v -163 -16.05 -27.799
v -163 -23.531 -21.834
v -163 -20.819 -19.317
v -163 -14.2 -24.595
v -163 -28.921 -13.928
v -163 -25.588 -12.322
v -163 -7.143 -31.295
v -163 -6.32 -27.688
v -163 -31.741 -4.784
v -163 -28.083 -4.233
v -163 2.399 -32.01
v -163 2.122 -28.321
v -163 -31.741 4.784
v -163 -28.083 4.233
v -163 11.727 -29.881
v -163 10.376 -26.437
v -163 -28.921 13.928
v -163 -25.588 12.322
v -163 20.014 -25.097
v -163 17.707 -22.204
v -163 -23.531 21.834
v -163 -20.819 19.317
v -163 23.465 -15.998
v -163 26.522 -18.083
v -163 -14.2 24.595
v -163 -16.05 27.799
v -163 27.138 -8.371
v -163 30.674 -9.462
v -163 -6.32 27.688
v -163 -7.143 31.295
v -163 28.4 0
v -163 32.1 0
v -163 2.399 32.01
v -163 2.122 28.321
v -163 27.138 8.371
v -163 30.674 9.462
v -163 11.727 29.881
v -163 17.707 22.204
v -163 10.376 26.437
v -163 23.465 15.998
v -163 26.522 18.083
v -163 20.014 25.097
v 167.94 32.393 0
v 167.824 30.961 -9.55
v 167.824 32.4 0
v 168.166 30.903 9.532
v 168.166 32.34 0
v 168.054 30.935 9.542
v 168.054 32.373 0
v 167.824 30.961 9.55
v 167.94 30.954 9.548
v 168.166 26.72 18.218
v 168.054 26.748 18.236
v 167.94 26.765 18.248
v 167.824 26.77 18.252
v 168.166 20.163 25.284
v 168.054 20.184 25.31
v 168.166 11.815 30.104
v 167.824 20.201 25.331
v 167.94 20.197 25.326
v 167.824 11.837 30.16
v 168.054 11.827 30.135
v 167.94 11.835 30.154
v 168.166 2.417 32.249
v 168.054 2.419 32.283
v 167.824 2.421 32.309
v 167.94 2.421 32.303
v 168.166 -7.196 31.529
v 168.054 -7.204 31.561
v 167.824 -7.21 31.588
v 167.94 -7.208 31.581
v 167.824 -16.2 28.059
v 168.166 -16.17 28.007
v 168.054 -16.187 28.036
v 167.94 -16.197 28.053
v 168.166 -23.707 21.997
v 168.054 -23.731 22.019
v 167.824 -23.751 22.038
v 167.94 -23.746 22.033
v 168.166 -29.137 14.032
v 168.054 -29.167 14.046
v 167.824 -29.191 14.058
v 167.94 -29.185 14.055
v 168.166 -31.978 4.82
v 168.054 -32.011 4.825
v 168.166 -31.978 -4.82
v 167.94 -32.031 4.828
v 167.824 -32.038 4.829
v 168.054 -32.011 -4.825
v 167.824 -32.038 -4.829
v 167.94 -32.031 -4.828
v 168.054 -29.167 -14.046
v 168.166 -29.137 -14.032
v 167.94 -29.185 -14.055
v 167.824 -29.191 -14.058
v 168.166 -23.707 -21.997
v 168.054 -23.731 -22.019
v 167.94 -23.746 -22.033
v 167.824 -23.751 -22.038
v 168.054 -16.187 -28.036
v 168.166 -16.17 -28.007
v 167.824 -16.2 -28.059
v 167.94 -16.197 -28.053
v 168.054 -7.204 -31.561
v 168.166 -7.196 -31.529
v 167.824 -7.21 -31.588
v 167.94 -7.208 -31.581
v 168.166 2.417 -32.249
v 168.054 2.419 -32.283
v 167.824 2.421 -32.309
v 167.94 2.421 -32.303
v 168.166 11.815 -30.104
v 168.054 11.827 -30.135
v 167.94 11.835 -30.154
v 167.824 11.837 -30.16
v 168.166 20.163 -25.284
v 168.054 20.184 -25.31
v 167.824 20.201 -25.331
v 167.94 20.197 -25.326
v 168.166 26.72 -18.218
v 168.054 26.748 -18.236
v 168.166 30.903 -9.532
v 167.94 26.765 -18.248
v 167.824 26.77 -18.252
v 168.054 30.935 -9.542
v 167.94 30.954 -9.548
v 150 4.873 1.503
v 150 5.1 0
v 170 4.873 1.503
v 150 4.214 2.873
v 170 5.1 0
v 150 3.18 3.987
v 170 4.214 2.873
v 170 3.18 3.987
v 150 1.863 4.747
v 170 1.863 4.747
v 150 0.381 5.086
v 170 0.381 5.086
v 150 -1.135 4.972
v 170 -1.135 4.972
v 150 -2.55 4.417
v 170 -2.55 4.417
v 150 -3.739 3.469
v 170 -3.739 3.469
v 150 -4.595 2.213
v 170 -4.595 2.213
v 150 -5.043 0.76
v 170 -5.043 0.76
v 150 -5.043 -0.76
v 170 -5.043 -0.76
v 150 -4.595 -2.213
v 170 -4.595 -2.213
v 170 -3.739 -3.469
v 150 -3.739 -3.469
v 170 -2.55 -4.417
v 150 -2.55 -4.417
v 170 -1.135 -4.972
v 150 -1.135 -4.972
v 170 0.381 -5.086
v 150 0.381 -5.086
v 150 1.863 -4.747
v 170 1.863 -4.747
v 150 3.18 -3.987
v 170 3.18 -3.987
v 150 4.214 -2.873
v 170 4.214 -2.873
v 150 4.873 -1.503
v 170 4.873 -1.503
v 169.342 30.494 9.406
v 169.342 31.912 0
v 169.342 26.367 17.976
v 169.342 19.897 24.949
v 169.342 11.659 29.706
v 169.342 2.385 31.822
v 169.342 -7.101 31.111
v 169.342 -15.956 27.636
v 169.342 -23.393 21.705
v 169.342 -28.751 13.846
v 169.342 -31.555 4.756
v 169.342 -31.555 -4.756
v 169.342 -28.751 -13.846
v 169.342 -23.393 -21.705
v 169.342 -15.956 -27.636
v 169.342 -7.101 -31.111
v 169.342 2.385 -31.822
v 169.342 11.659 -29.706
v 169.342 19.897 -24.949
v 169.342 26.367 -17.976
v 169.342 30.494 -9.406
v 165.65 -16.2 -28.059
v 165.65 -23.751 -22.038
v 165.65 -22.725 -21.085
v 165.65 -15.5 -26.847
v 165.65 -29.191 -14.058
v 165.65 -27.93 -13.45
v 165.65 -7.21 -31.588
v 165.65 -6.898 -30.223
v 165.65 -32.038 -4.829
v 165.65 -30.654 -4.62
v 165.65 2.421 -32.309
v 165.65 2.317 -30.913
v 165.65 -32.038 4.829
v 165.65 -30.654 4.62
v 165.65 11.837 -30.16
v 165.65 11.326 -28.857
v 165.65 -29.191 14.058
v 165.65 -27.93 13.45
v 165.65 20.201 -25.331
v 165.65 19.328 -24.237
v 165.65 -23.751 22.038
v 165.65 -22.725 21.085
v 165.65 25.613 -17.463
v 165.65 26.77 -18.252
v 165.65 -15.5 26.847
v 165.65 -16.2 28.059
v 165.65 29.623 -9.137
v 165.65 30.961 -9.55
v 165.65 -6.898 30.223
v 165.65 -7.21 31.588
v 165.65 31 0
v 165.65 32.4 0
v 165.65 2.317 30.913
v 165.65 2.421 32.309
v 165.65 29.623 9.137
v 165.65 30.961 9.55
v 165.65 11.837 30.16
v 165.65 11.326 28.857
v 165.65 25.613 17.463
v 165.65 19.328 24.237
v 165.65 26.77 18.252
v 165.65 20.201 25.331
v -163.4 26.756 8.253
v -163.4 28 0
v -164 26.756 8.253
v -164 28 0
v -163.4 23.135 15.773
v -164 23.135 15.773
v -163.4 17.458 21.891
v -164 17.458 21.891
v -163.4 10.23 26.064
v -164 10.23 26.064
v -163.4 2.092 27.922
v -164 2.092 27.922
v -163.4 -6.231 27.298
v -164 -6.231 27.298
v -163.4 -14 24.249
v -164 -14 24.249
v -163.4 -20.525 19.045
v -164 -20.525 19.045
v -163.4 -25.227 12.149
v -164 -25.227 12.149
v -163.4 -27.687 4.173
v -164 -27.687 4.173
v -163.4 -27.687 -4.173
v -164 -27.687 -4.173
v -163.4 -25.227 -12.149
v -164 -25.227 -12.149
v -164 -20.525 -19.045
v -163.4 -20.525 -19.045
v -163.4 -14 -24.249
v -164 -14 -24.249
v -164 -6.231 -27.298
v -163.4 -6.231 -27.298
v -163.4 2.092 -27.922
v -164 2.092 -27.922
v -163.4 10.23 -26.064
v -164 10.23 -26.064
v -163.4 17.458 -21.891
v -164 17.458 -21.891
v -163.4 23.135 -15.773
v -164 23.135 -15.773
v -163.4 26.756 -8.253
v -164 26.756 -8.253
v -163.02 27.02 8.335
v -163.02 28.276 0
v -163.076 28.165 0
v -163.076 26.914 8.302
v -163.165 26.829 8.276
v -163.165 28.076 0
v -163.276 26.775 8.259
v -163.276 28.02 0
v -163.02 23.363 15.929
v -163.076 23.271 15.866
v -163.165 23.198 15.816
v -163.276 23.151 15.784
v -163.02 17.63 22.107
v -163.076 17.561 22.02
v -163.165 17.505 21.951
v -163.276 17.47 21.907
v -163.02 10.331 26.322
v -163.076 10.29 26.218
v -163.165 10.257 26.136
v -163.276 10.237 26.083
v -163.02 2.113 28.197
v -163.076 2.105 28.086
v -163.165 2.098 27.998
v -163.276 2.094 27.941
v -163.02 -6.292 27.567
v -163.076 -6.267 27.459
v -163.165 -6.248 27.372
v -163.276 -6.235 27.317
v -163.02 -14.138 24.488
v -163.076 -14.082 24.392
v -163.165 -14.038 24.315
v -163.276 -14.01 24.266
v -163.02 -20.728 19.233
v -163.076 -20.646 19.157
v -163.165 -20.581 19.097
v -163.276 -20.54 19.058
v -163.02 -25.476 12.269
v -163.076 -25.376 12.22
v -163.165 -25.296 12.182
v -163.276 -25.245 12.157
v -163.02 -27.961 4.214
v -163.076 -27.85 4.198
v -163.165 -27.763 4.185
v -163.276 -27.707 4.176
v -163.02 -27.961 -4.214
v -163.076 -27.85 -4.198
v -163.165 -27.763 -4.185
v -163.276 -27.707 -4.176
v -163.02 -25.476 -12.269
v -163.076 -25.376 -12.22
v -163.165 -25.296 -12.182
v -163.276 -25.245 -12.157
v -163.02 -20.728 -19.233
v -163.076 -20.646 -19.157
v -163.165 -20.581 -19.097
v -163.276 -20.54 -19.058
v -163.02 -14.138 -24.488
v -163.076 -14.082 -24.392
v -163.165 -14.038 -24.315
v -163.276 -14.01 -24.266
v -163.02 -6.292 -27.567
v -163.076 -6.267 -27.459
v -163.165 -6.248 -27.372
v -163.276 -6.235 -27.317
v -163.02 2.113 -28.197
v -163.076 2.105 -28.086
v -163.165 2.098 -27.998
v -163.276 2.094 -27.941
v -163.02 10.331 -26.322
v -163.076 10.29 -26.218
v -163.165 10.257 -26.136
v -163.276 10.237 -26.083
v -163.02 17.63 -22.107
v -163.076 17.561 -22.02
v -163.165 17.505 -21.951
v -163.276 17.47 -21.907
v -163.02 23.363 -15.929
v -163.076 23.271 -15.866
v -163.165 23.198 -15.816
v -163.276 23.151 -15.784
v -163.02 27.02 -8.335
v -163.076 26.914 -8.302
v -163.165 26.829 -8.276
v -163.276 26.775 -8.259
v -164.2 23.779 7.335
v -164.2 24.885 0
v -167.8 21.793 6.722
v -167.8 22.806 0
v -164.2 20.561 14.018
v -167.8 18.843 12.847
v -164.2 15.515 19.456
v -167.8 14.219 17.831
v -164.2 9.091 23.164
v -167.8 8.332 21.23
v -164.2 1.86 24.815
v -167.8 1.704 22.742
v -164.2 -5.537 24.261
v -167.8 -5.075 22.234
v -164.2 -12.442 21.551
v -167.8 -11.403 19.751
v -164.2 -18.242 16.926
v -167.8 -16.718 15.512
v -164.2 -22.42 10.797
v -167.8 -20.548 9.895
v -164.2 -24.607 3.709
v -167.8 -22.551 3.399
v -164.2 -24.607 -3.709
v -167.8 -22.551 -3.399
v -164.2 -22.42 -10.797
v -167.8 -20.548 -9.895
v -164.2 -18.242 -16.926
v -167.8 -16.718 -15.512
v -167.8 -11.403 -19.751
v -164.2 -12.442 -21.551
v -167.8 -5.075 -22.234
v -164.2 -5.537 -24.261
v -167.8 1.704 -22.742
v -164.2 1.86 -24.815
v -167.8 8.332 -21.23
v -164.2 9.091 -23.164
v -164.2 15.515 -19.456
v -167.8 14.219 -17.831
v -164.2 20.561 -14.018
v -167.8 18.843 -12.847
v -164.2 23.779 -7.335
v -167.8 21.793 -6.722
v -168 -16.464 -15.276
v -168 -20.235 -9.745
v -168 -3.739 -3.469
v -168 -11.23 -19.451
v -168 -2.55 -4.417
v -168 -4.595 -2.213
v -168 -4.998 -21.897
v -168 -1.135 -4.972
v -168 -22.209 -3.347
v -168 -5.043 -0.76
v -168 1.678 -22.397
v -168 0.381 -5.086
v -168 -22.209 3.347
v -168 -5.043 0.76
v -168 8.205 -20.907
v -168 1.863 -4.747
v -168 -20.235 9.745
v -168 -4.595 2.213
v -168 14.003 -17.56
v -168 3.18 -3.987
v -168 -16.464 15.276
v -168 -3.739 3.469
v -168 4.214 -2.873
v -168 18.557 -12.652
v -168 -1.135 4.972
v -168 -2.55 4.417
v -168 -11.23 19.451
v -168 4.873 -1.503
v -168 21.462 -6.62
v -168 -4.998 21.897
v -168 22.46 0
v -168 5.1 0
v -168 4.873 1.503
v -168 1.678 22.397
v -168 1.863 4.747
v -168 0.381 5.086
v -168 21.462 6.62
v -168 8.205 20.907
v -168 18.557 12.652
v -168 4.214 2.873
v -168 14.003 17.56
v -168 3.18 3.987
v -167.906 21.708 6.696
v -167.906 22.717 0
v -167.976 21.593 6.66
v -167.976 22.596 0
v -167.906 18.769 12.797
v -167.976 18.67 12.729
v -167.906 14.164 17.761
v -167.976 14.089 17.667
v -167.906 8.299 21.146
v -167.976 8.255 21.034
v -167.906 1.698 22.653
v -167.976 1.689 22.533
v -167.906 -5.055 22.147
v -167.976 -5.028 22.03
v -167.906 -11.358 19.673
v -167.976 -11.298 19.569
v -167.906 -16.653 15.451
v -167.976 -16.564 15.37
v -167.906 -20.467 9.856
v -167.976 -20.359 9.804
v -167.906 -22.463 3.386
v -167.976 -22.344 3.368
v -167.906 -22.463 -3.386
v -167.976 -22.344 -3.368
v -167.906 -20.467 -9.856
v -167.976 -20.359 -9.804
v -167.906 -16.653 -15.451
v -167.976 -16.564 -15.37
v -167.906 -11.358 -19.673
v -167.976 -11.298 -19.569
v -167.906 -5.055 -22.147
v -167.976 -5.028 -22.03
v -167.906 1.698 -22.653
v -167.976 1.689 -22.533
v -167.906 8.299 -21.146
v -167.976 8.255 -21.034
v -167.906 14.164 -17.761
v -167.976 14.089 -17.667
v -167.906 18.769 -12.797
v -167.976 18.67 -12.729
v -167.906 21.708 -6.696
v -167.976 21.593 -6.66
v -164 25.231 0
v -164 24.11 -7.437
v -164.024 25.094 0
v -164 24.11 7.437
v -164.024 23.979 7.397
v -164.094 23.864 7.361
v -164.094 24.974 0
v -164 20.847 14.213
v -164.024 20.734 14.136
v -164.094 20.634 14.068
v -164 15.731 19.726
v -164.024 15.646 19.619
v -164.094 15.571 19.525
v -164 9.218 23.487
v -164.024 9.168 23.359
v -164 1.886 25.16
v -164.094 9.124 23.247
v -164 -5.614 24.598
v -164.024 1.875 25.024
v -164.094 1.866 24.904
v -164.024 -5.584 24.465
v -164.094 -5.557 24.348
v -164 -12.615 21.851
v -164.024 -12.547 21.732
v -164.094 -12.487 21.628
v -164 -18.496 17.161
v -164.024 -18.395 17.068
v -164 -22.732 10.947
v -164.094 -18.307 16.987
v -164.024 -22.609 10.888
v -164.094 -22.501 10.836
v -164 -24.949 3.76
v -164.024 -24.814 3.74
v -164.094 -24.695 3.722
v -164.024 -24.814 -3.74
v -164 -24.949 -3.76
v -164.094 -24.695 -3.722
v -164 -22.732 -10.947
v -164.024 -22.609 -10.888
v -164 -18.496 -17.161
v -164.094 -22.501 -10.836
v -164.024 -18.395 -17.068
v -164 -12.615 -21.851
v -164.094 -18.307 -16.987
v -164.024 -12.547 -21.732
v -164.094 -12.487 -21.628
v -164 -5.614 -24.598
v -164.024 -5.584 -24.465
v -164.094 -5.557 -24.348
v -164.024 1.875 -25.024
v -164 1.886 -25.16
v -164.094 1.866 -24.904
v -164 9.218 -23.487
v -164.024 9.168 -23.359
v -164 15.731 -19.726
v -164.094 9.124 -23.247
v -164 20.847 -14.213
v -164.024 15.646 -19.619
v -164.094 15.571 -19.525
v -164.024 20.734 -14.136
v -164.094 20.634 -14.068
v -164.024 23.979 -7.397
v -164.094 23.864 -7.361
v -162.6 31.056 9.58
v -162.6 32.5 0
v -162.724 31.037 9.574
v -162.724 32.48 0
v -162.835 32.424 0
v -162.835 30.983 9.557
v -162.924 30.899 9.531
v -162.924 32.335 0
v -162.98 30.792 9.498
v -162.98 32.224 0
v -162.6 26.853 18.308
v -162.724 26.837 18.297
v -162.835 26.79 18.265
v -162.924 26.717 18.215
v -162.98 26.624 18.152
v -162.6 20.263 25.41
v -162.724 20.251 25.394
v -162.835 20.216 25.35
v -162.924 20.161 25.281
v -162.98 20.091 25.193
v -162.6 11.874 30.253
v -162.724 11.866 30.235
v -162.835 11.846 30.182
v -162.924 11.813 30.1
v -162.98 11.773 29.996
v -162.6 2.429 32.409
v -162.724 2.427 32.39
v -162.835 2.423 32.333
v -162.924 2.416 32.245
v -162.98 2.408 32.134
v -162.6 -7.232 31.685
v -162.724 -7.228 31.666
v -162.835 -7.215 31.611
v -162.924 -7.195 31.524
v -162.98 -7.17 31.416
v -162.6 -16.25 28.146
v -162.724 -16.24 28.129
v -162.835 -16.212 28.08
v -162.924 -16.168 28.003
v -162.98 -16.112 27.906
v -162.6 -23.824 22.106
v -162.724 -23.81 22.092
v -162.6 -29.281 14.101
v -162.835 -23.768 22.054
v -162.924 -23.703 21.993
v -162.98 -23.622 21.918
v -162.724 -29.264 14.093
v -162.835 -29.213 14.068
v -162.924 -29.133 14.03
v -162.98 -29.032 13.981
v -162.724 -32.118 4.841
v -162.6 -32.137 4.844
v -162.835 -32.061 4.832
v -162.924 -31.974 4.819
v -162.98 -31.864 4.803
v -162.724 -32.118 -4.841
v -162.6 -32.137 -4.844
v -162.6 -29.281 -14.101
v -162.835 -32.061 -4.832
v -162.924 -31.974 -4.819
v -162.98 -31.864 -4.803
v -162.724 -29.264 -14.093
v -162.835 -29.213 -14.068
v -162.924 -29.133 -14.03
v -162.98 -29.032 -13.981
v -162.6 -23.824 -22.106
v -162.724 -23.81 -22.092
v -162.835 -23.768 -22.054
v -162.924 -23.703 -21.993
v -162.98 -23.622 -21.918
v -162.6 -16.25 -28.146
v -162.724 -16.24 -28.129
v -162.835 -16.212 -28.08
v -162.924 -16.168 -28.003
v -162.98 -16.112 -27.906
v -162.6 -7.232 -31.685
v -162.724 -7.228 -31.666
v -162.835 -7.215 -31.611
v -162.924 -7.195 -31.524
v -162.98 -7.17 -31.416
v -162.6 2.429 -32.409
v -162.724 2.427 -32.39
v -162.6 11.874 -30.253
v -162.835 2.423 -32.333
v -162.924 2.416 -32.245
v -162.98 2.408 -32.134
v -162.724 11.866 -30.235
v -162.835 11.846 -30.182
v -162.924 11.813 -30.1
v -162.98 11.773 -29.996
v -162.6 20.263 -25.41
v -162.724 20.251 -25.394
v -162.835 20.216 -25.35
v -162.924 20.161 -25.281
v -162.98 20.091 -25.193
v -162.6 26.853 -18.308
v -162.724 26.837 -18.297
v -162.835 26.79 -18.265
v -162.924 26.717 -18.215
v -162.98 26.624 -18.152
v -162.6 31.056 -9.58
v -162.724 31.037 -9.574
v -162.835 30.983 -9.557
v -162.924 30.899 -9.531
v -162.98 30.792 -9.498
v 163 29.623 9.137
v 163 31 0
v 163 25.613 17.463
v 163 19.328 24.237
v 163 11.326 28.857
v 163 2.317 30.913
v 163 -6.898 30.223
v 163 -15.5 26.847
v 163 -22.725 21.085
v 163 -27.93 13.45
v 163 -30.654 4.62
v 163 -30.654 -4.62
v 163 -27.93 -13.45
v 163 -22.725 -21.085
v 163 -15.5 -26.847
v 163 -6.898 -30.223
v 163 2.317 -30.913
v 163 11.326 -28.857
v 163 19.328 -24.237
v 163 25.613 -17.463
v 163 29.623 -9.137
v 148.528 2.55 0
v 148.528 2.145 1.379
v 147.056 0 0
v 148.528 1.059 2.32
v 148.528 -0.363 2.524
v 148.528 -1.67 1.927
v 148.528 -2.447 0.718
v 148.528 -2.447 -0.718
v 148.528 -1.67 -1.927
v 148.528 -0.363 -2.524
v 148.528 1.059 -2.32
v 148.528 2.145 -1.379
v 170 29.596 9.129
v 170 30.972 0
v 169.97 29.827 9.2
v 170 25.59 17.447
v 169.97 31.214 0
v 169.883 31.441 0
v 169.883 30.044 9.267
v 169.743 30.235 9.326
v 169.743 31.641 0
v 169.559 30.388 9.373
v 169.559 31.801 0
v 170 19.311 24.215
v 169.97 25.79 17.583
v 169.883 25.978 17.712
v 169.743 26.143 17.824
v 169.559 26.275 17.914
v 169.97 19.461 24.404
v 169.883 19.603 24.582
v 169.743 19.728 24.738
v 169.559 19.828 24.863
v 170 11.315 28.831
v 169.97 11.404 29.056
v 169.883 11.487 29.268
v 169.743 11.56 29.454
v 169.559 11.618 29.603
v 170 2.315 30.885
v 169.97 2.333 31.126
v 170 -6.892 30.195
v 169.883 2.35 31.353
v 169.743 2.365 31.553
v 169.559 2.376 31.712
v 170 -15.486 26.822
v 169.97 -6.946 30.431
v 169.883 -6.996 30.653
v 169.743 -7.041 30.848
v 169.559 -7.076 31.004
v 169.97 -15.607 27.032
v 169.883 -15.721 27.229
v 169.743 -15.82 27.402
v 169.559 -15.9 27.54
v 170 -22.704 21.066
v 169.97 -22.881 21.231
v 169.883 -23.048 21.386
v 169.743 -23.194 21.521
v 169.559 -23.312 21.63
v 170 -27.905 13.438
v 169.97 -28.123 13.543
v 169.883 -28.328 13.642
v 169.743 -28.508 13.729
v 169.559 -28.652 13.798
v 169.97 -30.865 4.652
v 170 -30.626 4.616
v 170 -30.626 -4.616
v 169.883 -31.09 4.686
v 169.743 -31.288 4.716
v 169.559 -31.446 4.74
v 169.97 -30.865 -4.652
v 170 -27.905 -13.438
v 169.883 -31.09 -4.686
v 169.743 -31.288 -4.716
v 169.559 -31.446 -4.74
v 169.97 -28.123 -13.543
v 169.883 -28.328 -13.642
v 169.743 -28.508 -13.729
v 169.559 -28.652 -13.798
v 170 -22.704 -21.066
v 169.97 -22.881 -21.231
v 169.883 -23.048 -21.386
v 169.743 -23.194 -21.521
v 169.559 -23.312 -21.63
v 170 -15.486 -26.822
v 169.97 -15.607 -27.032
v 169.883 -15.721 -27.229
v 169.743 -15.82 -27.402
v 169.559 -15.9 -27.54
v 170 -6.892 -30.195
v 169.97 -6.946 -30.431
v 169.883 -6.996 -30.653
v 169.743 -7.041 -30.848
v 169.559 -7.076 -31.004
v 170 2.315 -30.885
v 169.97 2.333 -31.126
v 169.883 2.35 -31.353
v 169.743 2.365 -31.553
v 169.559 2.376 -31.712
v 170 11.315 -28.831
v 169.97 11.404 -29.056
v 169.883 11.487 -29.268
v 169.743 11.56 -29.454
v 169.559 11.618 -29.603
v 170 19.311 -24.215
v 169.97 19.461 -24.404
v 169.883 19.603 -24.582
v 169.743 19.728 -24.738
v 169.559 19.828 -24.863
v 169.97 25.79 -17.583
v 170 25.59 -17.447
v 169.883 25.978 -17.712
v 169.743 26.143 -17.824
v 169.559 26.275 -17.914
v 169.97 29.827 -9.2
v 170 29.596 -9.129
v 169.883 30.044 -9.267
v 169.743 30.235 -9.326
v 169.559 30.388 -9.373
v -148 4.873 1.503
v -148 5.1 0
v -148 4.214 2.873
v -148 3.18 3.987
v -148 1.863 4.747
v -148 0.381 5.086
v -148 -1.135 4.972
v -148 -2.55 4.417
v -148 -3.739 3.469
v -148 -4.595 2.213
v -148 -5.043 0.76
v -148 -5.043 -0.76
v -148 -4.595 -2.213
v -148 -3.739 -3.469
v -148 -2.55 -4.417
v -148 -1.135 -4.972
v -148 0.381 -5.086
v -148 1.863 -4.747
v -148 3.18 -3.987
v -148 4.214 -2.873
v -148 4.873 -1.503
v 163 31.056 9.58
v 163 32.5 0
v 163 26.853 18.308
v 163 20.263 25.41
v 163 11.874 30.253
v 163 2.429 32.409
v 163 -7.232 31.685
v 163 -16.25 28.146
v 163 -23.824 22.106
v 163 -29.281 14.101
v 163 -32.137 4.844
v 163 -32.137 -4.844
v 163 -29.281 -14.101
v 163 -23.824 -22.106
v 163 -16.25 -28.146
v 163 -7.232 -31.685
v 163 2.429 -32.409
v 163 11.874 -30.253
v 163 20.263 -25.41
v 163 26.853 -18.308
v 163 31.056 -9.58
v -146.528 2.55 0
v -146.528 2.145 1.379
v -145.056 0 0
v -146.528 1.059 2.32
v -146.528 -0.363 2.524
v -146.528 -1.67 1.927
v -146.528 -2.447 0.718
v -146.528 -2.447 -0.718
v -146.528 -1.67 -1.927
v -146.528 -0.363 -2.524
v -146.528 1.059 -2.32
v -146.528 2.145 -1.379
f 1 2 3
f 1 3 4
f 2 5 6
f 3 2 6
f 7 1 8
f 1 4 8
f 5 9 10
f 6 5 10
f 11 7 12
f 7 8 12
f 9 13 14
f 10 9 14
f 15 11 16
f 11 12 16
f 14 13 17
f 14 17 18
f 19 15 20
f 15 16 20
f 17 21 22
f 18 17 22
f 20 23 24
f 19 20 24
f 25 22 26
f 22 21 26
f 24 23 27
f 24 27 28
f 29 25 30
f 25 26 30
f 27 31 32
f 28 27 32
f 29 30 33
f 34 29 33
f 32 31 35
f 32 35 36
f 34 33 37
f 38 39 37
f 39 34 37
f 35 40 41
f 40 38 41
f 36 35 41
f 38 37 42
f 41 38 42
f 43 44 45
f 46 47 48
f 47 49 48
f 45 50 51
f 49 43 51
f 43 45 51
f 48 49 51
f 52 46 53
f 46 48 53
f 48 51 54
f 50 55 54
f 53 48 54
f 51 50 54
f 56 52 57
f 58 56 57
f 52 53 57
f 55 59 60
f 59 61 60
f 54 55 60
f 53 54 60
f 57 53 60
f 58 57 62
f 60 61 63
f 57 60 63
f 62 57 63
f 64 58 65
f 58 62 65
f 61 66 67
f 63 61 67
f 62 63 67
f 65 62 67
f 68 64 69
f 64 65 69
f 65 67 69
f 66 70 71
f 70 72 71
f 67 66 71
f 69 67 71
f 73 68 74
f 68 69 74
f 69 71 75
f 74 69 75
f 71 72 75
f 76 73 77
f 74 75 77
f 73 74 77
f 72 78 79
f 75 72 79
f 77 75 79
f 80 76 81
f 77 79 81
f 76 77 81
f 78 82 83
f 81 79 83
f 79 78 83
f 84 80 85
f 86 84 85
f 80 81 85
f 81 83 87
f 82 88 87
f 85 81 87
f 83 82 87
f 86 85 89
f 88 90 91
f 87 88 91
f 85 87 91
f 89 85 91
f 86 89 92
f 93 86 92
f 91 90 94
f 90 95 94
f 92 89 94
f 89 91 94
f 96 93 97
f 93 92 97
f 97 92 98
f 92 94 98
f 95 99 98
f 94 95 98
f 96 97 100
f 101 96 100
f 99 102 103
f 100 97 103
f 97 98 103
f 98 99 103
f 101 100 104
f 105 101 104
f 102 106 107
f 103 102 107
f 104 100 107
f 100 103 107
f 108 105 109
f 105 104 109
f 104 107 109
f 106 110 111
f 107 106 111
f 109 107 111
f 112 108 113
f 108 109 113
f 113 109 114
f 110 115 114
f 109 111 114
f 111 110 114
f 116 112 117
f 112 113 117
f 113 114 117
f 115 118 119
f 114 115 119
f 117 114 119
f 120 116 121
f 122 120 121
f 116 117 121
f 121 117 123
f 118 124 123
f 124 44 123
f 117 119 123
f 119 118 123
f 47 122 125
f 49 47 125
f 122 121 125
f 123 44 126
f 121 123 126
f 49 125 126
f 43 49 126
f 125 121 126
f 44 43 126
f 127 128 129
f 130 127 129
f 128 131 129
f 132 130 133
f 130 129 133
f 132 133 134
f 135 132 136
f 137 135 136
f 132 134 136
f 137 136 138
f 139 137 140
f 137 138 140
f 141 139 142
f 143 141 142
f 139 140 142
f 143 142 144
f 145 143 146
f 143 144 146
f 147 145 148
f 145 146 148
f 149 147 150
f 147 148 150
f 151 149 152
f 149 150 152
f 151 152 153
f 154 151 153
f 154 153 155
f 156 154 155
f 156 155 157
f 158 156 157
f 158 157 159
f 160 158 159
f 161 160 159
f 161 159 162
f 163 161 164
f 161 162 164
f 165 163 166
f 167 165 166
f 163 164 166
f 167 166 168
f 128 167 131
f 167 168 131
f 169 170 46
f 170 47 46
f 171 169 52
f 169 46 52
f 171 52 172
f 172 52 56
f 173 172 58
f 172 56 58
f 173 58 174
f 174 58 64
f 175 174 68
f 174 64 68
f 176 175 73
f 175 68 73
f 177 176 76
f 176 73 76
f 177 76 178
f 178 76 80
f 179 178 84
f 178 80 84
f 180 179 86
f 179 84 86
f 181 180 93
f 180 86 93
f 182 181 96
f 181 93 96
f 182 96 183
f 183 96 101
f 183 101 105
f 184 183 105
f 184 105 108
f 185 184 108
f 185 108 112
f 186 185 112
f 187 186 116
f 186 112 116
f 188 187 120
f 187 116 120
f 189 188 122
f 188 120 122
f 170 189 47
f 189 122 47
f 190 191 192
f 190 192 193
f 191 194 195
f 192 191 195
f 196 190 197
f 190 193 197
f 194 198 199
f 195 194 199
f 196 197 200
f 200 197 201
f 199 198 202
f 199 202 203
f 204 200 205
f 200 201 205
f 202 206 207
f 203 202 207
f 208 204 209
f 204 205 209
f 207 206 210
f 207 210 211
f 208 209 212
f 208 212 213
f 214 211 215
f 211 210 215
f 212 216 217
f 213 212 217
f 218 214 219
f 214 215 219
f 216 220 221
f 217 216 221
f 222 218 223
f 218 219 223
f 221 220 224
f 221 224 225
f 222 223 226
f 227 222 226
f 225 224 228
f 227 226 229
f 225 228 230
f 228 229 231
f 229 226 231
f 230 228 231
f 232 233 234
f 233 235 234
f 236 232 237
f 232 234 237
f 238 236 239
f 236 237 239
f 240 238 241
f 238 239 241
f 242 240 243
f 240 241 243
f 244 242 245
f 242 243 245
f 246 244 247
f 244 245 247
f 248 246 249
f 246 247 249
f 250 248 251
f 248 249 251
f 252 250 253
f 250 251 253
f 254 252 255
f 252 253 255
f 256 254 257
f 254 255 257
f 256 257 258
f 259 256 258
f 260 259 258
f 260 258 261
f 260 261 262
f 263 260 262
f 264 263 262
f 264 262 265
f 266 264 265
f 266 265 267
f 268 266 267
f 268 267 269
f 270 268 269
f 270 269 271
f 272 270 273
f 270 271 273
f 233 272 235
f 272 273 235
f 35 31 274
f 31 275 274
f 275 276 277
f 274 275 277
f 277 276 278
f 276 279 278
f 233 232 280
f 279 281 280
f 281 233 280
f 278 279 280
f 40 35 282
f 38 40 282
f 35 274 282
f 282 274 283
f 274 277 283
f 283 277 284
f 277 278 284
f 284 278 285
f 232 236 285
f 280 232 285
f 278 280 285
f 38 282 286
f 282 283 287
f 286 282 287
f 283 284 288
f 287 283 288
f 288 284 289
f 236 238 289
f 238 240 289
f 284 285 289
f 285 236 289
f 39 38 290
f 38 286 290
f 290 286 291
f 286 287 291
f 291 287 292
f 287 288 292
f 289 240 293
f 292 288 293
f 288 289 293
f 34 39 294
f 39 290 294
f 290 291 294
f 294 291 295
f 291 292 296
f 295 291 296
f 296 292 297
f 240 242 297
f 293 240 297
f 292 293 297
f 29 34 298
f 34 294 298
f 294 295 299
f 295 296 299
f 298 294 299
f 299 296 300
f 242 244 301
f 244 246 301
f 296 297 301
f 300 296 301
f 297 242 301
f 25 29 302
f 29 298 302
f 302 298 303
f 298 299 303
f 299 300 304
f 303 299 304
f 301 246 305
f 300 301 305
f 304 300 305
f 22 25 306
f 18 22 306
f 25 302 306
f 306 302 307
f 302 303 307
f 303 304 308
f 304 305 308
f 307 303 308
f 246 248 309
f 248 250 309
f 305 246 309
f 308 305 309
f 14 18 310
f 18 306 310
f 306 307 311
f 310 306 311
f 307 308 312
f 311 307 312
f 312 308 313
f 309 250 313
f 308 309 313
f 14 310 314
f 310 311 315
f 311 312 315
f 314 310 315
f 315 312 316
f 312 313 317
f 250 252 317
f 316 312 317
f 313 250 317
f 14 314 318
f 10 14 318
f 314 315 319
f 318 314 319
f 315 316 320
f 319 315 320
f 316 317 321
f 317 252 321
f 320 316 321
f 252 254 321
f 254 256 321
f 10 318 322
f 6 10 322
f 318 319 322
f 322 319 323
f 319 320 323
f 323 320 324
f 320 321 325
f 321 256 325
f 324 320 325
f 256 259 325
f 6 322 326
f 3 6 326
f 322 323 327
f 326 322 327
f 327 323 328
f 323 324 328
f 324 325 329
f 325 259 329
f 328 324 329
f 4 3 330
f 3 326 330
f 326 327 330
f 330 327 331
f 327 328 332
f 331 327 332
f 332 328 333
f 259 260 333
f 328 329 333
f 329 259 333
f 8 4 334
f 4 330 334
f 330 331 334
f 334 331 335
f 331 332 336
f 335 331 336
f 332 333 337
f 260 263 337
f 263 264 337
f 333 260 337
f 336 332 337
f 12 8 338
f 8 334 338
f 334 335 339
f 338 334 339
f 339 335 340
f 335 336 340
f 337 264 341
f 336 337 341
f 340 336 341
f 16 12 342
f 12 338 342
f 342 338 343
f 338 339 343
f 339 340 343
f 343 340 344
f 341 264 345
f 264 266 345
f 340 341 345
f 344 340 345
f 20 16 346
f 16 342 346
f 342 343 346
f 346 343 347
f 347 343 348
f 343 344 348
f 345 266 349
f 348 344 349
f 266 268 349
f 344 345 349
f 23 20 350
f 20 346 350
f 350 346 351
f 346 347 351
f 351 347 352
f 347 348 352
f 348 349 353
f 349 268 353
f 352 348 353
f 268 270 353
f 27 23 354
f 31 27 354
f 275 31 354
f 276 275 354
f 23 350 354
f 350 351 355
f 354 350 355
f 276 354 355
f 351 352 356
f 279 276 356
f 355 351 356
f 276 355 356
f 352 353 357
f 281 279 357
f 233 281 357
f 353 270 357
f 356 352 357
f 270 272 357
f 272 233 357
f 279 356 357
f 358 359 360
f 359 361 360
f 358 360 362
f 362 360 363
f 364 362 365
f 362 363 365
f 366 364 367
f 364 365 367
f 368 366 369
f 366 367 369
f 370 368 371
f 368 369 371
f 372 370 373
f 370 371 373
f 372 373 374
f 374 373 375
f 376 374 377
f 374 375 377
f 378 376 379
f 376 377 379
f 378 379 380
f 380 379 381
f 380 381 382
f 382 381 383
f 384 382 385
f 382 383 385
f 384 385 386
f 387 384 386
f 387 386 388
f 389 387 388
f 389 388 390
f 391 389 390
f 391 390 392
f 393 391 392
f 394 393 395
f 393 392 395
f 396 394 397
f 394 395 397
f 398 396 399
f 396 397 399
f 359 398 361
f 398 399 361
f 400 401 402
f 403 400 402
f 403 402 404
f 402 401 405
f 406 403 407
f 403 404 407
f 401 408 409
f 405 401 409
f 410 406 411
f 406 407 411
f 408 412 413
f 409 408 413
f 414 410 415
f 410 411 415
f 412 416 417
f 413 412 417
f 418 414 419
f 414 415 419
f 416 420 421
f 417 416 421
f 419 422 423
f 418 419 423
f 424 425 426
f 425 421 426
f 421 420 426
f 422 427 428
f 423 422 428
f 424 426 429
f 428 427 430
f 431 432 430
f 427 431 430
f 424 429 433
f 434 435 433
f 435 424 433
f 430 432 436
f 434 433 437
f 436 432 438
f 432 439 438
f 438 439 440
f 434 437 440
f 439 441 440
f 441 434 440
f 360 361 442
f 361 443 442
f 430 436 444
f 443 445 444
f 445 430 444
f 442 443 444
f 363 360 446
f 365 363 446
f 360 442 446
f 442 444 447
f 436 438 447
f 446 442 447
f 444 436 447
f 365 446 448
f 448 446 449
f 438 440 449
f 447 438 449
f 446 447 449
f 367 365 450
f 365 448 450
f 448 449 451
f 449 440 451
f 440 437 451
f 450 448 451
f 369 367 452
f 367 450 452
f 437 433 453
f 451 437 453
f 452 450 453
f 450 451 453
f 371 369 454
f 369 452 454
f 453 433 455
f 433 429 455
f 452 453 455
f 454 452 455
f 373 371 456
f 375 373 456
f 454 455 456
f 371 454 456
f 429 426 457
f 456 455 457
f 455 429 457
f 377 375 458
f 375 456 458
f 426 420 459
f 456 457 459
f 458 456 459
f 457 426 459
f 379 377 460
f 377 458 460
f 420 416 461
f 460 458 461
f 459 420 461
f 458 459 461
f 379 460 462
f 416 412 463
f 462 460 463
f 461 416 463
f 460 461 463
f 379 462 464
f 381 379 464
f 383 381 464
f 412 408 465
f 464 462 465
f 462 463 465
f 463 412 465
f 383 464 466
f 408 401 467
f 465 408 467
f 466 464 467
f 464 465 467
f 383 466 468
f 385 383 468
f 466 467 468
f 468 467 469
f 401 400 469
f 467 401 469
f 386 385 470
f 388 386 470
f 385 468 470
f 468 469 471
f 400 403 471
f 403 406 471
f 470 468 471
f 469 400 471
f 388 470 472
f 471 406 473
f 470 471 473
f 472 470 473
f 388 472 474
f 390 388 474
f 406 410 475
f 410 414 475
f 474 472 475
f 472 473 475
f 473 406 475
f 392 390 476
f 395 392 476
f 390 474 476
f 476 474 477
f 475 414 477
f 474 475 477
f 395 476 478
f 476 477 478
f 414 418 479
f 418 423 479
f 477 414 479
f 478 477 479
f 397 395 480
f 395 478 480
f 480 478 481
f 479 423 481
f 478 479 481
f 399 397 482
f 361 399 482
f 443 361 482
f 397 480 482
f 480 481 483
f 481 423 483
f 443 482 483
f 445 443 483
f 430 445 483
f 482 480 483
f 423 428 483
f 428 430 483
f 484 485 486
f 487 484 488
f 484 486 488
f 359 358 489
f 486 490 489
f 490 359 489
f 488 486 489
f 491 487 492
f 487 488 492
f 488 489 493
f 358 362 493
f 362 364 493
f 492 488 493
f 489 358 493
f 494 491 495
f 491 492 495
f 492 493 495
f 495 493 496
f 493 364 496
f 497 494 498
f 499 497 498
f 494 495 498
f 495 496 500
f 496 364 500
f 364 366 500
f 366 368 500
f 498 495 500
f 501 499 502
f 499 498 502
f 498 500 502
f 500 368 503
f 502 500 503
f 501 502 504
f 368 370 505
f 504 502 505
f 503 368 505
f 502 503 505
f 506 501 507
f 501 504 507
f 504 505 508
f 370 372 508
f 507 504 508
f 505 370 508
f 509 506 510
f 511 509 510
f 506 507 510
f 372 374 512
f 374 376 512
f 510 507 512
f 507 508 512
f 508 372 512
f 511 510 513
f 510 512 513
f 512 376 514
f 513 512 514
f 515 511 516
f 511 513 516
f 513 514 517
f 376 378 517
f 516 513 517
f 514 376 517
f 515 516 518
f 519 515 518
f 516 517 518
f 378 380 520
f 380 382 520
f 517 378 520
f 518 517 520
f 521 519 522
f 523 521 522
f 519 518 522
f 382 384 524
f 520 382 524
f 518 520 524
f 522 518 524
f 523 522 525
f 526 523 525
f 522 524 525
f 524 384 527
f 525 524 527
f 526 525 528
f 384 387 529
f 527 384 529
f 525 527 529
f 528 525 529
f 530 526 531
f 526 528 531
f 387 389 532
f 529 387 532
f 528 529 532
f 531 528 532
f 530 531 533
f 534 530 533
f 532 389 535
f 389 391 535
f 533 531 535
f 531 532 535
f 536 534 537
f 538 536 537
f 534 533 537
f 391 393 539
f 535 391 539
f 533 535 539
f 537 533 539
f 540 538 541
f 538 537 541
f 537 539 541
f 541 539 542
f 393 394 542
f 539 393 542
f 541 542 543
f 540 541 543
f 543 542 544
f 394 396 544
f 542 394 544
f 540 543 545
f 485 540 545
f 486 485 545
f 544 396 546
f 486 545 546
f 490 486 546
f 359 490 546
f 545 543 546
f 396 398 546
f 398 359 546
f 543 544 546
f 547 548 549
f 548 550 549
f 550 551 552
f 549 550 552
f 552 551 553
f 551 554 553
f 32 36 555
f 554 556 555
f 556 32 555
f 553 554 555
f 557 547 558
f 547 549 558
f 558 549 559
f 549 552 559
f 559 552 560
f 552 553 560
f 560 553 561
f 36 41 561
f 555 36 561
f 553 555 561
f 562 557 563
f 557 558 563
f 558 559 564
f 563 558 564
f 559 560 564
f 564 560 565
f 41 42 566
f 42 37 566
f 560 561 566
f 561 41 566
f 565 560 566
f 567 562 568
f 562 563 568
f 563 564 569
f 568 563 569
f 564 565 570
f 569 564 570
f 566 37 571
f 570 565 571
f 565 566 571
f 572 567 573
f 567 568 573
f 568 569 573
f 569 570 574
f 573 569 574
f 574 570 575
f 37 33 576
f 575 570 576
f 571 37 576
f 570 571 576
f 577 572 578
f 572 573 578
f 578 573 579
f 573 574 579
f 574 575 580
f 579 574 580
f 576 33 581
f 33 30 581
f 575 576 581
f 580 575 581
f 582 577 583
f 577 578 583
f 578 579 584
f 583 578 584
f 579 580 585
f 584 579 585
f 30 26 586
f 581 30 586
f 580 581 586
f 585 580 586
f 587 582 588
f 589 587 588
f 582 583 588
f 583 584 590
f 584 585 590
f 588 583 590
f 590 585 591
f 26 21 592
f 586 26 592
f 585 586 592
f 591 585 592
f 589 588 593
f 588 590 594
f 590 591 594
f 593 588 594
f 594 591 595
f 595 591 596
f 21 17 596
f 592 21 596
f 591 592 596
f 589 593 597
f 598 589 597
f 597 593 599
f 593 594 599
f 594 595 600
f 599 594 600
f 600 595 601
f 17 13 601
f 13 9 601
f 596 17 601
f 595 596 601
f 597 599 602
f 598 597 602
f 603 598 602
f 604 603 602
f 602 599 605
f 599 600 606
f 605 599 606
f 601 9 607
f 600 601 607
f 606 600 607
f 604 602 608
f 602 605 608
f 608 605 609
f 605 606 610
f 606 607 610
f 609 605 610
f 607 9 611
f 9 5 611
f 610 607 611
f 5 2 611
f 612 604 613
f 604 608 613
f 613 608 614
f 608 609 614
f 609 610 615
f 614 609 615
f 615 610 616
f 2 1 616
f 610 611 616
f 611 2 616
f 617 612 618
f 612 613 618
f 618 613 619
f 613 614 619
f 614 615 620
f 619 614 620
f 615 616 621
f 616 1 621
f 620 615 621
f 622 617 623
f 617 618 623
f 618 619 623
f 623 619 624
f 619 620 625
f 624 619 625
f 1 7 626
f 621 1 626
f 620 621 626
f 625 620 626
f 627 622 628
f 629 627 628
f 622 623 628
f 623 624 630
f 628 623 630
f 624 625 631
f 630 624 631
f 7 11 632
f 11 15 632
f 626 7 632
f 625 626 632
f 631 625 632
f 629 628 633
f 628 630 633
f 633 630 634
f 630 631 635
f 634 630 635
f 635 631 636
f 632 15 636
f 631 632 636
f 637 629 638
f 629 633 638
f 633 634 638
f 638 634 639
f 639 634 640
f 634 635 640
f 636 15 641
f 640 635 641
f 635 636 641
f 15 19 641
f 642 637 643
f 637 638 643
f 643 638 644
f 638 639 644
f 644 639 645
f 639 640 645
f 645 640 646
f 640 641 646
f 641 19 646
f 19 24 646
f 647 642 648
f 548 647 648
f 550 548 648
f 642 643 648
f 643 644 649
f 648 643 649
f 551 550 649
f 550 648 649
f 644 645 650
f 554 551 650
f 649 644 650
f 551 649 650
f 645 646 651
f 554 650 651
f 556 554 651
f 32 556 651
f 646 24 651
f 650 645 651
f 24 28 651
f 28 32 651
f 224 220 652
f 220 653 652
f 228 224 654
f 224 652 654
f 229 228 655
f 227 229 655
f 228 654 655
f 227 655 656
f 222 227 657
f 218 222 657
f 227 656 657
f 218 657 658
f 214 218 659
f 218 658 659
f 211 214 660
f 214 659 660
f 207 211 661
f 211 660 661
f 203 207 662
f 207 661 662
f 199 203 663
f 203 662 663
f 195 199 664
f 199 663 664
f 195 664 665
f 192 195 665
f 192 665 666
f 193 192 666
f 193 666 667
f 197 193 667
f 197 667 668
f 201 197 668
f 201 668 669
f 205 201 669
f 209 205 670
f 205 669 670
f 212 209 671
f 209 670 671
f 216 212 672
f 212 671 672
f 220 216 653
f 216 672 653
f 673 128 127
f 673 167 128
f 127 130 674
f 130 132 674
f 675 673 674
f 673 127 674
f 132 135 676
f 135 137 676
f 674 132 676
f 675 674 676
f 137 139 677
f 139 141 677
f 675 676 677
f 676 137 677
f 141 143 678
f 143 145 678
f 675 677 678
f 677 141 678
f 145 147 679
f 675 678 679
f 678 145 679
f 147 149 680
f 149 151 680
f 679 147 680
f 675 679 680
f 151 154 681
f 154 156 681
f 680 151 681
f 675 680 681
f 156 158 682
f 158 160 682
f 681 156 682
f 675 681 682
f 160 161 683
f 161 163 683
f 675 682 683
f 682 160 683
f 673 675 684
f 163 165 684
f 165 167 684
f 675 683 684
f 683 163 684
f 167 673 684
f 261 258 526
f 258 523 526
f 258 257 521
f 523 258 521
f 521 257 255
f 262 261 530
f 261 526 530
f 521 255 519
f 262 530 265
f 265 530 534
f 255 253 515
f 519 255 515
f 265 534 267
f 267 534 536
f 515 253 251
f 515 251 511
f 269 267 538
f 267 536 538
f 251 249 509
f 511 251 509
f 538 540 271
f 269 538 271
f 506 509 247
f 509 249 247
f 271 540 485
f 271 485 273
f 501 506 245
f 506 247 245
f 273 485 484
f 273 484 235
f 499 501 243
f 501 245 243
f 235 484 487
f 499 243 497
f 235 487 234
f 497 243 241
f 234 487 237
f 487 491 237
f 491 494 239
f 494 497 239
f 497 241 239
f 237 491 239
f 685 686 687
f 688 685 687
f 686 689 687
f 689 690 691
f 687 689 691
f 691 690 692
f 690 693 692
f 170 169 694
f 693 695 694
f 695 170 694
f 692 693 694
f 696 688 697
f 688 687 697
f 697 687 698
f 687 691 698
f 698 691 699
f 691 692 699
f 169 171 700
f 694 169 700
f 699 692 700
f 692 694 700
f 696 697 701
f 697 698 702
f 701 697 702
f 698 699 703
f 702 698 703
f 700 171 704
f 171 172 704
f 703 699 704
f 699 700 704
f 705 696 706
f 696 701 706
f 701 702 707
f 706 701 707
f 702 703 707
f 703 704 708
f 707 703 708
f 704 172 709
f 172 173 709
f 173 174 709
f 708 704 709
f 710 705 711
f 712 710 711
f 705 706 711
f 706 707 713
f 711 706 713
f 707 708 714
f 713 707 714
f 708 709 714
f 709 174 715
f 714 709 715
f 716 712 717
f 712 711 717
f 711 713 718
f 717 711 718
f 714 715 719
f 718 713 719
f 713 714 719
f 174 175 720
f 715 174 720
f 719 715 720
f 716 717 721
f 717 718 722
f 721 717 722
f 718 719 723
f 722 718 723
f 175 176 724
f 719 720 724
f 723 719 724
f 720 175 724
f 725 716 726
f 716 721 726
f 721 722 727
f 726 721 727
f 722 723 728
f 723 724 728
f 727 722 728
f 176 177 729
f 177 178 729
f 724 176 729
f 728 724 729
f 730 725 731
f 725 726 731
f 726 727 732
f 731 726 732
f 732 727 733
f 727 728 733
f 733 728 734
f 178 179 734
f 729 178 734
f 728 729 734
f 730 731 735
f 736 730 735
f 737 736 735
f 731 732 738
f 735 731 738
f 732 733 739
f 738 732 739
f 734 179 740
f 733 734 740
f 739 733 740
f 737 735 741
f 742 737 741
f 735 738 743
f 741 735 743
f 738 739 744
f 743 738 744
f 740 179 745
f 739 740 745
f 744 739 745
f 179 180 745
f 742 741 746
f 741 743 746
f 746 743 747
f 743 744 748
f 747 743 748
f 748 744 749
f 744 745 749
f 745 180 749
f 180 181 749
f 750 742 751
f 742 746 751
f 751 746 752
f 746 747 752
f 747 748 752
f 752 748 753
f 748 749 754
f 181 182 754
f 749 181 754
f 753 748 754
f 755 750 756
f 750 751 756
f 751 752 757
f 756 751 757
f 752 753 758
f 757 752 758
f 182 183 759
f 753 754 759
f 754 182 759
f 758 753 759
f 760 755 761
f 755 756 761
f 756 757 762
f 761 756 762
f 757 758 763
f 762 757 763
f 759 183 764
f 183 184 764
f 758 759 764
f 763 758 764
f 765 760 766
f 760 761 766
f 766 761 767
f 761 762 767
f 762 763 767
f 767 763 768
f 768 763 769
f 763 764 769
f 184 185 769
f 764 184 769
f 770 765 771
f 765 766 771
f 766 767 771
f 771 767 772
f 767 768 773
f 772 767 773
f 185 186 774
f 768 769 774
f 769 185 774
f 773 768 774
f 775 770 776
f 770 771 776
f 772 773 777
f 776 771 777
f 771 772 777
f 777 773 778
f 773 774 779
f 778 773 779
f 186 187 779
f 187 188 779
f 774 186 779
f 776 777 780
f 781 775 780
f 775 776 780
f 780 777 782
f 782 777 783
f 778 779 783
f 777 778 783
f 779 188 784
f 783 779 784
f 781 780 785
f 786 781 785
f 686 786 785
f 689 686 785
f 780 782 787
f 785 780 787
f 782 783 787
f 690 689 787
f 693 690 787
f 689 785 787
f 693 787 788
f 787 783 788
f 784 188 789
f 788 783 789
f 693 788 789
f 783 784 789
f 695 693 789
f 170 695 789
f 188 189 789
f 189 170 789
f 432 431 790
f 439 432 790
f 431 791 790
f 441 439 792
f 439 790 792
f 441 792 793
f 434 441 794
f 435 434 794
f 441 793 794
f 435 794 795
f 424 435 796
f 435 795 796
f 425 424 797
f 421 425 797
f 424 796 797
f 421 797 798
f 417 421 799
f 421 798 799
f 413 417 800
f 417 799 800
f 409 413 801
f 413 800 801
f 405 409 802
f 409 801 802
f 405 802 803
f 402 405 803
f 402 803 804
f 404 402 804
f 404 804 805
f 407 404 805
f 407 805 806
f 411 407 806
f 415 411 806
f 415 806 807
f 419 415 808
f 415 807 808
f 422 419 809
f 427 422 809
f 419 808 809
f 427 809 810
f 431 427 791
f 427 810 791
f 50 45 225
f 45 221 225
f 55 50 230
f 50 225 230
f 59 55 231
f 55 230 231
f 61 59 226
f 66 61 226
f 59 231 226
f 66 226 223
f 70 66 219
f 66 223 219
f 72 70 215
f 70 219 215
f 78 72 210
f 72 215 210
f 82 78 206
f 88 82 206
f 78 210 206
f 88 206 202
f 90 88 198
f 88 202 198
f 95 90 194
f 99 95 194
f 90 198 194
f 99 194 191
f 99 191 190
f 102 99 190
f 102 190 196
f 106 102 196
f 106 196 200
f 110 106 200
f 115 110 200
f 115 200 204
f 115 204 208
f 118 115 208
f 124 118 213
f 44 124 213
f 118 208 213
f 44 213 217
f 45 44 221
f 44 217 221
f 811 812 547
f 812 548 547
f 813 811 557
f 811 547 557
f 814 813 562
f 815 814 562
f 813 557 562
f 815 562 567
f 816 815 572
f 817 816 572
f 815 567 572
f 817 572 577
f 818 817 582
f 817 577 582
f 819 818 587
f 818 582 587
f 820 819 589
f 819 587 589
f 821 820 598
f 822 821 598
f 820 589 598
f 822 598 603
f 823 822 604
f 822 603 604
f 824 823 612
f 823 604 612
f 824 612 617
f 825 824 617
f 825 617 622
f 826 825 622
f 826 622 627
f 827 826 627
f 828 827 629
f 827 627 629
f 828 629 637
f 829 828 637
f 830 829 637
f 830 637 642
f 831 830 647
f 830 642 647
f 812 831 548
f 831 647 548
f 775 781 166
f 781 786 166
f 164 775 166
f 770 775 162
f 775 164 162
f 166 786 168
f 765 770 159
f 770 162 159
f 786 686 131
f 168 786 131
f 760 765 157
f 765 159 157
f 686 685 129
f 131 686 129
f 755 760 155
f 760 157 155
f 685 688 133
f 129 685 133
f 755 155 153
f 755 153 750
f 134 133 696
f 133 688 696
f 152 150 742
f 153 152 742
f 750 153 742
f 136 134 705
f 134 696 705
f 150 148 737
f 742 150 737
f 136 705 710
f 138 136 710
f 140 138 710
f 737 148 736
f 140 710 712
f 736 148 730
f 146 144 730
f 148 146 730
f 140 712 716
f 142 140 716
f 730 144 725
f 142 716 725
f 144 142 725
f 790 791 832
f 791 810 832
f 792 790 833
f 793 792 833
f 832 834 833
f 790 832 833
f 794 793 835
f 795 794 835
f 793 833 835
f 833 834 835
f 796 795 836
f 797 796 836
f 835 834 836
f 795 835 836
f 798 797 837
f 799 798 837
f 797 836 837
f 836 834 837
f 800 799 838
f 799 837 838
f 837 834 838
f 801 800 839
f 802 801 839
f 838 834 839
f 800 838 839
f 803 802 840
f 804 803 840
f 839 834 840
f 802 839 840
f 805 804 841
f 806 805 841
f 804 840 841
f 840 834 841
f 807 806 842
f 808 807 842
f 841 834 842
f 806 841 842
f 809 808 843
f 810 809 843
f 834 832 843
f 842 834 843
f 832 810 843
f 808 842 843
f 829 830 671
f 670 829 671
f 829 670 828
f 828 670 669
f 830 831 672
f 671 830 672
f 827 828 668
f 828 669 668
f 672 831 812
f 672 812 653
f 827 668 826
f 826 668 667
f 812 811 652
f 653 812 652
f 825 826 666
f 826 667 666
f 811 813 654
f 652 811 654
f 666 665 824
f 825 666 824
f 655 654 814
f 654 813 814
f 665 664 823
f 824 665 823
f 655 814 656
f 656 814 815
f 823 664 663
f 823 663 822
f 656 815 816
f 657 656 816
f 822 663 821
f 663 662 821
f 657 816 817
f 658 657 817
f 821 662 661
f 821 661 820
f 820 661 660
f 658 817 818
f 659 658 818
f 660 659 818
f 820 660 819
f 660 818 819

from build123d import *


with BuildPart() as part:
    # Sketch1 → Base-Revolve (revolve)
    with BuildSketch(Plane.XY):
        with BuildLine():
            Line((163, 32.5), (0, 32.5))
            Line((0, 32.5), (-162.6, 32.5))
            ThreePointArc((-162.6, 32.5), (-162.882842712, 32.382842712), (-163, 32.1))
            Line((-163, 32.1), (-163, 28.4))
            ThreePointArc((-163, 28.4), (-163.117157288, 28.117157288), (-163.4, 28))
            Line((-163.4, 28), (-164, 28))
            Line((-164, 28), (-164, 25.230940108))
            ThreePointArc((-164, 25.230940108), (-164.053589838, 25.030940108), (-164.2, 24.884529946))
            Line((-164.2, 24.884529946), (-167.8, 22.806068977))
            ThreePointArc((-167.8, 22.806068977), (-167.946410162, 22.659658816), (-168, 22.459658816))
            Line((-168, 22.459658816), (-168, 5.1))
            Line((-168, 5.1), (-148, 5.1))
            Line((-148, 5.1), (-145.055513627, 0))
            Line((-145.055513627, 0), (147.055513627, 0))
            Line((147.055513627, 0), (150, 5.1))
            Line((150, 5.1), (170, 5.1))
            Line((170, 5.1), (170, 30.971851993))
            ThreePointArc((170, 30.971851993), (169.819152044, 31.54542843), (169.342020143, 31.911544614))
            Line((169.342020143, 31.911544614), (168.165693163, 32.339692621))
            ThreePointArc((168.165693163, 32.339692621), (167.997321197, 32.384807753), (167.823673019, 32.4))
            Line((167.823673019, 32.4), (165.65, 32.4))
            Line((165.65, 32.4), (165.65, 31))
            Line((165.65, 31), (163, 31))
            Line((163, 31), (163, 32.5))
        make_face()
    revolve(axis=Axis((-168, 0, 0), (1, 0, 0)))


solid = part.part
